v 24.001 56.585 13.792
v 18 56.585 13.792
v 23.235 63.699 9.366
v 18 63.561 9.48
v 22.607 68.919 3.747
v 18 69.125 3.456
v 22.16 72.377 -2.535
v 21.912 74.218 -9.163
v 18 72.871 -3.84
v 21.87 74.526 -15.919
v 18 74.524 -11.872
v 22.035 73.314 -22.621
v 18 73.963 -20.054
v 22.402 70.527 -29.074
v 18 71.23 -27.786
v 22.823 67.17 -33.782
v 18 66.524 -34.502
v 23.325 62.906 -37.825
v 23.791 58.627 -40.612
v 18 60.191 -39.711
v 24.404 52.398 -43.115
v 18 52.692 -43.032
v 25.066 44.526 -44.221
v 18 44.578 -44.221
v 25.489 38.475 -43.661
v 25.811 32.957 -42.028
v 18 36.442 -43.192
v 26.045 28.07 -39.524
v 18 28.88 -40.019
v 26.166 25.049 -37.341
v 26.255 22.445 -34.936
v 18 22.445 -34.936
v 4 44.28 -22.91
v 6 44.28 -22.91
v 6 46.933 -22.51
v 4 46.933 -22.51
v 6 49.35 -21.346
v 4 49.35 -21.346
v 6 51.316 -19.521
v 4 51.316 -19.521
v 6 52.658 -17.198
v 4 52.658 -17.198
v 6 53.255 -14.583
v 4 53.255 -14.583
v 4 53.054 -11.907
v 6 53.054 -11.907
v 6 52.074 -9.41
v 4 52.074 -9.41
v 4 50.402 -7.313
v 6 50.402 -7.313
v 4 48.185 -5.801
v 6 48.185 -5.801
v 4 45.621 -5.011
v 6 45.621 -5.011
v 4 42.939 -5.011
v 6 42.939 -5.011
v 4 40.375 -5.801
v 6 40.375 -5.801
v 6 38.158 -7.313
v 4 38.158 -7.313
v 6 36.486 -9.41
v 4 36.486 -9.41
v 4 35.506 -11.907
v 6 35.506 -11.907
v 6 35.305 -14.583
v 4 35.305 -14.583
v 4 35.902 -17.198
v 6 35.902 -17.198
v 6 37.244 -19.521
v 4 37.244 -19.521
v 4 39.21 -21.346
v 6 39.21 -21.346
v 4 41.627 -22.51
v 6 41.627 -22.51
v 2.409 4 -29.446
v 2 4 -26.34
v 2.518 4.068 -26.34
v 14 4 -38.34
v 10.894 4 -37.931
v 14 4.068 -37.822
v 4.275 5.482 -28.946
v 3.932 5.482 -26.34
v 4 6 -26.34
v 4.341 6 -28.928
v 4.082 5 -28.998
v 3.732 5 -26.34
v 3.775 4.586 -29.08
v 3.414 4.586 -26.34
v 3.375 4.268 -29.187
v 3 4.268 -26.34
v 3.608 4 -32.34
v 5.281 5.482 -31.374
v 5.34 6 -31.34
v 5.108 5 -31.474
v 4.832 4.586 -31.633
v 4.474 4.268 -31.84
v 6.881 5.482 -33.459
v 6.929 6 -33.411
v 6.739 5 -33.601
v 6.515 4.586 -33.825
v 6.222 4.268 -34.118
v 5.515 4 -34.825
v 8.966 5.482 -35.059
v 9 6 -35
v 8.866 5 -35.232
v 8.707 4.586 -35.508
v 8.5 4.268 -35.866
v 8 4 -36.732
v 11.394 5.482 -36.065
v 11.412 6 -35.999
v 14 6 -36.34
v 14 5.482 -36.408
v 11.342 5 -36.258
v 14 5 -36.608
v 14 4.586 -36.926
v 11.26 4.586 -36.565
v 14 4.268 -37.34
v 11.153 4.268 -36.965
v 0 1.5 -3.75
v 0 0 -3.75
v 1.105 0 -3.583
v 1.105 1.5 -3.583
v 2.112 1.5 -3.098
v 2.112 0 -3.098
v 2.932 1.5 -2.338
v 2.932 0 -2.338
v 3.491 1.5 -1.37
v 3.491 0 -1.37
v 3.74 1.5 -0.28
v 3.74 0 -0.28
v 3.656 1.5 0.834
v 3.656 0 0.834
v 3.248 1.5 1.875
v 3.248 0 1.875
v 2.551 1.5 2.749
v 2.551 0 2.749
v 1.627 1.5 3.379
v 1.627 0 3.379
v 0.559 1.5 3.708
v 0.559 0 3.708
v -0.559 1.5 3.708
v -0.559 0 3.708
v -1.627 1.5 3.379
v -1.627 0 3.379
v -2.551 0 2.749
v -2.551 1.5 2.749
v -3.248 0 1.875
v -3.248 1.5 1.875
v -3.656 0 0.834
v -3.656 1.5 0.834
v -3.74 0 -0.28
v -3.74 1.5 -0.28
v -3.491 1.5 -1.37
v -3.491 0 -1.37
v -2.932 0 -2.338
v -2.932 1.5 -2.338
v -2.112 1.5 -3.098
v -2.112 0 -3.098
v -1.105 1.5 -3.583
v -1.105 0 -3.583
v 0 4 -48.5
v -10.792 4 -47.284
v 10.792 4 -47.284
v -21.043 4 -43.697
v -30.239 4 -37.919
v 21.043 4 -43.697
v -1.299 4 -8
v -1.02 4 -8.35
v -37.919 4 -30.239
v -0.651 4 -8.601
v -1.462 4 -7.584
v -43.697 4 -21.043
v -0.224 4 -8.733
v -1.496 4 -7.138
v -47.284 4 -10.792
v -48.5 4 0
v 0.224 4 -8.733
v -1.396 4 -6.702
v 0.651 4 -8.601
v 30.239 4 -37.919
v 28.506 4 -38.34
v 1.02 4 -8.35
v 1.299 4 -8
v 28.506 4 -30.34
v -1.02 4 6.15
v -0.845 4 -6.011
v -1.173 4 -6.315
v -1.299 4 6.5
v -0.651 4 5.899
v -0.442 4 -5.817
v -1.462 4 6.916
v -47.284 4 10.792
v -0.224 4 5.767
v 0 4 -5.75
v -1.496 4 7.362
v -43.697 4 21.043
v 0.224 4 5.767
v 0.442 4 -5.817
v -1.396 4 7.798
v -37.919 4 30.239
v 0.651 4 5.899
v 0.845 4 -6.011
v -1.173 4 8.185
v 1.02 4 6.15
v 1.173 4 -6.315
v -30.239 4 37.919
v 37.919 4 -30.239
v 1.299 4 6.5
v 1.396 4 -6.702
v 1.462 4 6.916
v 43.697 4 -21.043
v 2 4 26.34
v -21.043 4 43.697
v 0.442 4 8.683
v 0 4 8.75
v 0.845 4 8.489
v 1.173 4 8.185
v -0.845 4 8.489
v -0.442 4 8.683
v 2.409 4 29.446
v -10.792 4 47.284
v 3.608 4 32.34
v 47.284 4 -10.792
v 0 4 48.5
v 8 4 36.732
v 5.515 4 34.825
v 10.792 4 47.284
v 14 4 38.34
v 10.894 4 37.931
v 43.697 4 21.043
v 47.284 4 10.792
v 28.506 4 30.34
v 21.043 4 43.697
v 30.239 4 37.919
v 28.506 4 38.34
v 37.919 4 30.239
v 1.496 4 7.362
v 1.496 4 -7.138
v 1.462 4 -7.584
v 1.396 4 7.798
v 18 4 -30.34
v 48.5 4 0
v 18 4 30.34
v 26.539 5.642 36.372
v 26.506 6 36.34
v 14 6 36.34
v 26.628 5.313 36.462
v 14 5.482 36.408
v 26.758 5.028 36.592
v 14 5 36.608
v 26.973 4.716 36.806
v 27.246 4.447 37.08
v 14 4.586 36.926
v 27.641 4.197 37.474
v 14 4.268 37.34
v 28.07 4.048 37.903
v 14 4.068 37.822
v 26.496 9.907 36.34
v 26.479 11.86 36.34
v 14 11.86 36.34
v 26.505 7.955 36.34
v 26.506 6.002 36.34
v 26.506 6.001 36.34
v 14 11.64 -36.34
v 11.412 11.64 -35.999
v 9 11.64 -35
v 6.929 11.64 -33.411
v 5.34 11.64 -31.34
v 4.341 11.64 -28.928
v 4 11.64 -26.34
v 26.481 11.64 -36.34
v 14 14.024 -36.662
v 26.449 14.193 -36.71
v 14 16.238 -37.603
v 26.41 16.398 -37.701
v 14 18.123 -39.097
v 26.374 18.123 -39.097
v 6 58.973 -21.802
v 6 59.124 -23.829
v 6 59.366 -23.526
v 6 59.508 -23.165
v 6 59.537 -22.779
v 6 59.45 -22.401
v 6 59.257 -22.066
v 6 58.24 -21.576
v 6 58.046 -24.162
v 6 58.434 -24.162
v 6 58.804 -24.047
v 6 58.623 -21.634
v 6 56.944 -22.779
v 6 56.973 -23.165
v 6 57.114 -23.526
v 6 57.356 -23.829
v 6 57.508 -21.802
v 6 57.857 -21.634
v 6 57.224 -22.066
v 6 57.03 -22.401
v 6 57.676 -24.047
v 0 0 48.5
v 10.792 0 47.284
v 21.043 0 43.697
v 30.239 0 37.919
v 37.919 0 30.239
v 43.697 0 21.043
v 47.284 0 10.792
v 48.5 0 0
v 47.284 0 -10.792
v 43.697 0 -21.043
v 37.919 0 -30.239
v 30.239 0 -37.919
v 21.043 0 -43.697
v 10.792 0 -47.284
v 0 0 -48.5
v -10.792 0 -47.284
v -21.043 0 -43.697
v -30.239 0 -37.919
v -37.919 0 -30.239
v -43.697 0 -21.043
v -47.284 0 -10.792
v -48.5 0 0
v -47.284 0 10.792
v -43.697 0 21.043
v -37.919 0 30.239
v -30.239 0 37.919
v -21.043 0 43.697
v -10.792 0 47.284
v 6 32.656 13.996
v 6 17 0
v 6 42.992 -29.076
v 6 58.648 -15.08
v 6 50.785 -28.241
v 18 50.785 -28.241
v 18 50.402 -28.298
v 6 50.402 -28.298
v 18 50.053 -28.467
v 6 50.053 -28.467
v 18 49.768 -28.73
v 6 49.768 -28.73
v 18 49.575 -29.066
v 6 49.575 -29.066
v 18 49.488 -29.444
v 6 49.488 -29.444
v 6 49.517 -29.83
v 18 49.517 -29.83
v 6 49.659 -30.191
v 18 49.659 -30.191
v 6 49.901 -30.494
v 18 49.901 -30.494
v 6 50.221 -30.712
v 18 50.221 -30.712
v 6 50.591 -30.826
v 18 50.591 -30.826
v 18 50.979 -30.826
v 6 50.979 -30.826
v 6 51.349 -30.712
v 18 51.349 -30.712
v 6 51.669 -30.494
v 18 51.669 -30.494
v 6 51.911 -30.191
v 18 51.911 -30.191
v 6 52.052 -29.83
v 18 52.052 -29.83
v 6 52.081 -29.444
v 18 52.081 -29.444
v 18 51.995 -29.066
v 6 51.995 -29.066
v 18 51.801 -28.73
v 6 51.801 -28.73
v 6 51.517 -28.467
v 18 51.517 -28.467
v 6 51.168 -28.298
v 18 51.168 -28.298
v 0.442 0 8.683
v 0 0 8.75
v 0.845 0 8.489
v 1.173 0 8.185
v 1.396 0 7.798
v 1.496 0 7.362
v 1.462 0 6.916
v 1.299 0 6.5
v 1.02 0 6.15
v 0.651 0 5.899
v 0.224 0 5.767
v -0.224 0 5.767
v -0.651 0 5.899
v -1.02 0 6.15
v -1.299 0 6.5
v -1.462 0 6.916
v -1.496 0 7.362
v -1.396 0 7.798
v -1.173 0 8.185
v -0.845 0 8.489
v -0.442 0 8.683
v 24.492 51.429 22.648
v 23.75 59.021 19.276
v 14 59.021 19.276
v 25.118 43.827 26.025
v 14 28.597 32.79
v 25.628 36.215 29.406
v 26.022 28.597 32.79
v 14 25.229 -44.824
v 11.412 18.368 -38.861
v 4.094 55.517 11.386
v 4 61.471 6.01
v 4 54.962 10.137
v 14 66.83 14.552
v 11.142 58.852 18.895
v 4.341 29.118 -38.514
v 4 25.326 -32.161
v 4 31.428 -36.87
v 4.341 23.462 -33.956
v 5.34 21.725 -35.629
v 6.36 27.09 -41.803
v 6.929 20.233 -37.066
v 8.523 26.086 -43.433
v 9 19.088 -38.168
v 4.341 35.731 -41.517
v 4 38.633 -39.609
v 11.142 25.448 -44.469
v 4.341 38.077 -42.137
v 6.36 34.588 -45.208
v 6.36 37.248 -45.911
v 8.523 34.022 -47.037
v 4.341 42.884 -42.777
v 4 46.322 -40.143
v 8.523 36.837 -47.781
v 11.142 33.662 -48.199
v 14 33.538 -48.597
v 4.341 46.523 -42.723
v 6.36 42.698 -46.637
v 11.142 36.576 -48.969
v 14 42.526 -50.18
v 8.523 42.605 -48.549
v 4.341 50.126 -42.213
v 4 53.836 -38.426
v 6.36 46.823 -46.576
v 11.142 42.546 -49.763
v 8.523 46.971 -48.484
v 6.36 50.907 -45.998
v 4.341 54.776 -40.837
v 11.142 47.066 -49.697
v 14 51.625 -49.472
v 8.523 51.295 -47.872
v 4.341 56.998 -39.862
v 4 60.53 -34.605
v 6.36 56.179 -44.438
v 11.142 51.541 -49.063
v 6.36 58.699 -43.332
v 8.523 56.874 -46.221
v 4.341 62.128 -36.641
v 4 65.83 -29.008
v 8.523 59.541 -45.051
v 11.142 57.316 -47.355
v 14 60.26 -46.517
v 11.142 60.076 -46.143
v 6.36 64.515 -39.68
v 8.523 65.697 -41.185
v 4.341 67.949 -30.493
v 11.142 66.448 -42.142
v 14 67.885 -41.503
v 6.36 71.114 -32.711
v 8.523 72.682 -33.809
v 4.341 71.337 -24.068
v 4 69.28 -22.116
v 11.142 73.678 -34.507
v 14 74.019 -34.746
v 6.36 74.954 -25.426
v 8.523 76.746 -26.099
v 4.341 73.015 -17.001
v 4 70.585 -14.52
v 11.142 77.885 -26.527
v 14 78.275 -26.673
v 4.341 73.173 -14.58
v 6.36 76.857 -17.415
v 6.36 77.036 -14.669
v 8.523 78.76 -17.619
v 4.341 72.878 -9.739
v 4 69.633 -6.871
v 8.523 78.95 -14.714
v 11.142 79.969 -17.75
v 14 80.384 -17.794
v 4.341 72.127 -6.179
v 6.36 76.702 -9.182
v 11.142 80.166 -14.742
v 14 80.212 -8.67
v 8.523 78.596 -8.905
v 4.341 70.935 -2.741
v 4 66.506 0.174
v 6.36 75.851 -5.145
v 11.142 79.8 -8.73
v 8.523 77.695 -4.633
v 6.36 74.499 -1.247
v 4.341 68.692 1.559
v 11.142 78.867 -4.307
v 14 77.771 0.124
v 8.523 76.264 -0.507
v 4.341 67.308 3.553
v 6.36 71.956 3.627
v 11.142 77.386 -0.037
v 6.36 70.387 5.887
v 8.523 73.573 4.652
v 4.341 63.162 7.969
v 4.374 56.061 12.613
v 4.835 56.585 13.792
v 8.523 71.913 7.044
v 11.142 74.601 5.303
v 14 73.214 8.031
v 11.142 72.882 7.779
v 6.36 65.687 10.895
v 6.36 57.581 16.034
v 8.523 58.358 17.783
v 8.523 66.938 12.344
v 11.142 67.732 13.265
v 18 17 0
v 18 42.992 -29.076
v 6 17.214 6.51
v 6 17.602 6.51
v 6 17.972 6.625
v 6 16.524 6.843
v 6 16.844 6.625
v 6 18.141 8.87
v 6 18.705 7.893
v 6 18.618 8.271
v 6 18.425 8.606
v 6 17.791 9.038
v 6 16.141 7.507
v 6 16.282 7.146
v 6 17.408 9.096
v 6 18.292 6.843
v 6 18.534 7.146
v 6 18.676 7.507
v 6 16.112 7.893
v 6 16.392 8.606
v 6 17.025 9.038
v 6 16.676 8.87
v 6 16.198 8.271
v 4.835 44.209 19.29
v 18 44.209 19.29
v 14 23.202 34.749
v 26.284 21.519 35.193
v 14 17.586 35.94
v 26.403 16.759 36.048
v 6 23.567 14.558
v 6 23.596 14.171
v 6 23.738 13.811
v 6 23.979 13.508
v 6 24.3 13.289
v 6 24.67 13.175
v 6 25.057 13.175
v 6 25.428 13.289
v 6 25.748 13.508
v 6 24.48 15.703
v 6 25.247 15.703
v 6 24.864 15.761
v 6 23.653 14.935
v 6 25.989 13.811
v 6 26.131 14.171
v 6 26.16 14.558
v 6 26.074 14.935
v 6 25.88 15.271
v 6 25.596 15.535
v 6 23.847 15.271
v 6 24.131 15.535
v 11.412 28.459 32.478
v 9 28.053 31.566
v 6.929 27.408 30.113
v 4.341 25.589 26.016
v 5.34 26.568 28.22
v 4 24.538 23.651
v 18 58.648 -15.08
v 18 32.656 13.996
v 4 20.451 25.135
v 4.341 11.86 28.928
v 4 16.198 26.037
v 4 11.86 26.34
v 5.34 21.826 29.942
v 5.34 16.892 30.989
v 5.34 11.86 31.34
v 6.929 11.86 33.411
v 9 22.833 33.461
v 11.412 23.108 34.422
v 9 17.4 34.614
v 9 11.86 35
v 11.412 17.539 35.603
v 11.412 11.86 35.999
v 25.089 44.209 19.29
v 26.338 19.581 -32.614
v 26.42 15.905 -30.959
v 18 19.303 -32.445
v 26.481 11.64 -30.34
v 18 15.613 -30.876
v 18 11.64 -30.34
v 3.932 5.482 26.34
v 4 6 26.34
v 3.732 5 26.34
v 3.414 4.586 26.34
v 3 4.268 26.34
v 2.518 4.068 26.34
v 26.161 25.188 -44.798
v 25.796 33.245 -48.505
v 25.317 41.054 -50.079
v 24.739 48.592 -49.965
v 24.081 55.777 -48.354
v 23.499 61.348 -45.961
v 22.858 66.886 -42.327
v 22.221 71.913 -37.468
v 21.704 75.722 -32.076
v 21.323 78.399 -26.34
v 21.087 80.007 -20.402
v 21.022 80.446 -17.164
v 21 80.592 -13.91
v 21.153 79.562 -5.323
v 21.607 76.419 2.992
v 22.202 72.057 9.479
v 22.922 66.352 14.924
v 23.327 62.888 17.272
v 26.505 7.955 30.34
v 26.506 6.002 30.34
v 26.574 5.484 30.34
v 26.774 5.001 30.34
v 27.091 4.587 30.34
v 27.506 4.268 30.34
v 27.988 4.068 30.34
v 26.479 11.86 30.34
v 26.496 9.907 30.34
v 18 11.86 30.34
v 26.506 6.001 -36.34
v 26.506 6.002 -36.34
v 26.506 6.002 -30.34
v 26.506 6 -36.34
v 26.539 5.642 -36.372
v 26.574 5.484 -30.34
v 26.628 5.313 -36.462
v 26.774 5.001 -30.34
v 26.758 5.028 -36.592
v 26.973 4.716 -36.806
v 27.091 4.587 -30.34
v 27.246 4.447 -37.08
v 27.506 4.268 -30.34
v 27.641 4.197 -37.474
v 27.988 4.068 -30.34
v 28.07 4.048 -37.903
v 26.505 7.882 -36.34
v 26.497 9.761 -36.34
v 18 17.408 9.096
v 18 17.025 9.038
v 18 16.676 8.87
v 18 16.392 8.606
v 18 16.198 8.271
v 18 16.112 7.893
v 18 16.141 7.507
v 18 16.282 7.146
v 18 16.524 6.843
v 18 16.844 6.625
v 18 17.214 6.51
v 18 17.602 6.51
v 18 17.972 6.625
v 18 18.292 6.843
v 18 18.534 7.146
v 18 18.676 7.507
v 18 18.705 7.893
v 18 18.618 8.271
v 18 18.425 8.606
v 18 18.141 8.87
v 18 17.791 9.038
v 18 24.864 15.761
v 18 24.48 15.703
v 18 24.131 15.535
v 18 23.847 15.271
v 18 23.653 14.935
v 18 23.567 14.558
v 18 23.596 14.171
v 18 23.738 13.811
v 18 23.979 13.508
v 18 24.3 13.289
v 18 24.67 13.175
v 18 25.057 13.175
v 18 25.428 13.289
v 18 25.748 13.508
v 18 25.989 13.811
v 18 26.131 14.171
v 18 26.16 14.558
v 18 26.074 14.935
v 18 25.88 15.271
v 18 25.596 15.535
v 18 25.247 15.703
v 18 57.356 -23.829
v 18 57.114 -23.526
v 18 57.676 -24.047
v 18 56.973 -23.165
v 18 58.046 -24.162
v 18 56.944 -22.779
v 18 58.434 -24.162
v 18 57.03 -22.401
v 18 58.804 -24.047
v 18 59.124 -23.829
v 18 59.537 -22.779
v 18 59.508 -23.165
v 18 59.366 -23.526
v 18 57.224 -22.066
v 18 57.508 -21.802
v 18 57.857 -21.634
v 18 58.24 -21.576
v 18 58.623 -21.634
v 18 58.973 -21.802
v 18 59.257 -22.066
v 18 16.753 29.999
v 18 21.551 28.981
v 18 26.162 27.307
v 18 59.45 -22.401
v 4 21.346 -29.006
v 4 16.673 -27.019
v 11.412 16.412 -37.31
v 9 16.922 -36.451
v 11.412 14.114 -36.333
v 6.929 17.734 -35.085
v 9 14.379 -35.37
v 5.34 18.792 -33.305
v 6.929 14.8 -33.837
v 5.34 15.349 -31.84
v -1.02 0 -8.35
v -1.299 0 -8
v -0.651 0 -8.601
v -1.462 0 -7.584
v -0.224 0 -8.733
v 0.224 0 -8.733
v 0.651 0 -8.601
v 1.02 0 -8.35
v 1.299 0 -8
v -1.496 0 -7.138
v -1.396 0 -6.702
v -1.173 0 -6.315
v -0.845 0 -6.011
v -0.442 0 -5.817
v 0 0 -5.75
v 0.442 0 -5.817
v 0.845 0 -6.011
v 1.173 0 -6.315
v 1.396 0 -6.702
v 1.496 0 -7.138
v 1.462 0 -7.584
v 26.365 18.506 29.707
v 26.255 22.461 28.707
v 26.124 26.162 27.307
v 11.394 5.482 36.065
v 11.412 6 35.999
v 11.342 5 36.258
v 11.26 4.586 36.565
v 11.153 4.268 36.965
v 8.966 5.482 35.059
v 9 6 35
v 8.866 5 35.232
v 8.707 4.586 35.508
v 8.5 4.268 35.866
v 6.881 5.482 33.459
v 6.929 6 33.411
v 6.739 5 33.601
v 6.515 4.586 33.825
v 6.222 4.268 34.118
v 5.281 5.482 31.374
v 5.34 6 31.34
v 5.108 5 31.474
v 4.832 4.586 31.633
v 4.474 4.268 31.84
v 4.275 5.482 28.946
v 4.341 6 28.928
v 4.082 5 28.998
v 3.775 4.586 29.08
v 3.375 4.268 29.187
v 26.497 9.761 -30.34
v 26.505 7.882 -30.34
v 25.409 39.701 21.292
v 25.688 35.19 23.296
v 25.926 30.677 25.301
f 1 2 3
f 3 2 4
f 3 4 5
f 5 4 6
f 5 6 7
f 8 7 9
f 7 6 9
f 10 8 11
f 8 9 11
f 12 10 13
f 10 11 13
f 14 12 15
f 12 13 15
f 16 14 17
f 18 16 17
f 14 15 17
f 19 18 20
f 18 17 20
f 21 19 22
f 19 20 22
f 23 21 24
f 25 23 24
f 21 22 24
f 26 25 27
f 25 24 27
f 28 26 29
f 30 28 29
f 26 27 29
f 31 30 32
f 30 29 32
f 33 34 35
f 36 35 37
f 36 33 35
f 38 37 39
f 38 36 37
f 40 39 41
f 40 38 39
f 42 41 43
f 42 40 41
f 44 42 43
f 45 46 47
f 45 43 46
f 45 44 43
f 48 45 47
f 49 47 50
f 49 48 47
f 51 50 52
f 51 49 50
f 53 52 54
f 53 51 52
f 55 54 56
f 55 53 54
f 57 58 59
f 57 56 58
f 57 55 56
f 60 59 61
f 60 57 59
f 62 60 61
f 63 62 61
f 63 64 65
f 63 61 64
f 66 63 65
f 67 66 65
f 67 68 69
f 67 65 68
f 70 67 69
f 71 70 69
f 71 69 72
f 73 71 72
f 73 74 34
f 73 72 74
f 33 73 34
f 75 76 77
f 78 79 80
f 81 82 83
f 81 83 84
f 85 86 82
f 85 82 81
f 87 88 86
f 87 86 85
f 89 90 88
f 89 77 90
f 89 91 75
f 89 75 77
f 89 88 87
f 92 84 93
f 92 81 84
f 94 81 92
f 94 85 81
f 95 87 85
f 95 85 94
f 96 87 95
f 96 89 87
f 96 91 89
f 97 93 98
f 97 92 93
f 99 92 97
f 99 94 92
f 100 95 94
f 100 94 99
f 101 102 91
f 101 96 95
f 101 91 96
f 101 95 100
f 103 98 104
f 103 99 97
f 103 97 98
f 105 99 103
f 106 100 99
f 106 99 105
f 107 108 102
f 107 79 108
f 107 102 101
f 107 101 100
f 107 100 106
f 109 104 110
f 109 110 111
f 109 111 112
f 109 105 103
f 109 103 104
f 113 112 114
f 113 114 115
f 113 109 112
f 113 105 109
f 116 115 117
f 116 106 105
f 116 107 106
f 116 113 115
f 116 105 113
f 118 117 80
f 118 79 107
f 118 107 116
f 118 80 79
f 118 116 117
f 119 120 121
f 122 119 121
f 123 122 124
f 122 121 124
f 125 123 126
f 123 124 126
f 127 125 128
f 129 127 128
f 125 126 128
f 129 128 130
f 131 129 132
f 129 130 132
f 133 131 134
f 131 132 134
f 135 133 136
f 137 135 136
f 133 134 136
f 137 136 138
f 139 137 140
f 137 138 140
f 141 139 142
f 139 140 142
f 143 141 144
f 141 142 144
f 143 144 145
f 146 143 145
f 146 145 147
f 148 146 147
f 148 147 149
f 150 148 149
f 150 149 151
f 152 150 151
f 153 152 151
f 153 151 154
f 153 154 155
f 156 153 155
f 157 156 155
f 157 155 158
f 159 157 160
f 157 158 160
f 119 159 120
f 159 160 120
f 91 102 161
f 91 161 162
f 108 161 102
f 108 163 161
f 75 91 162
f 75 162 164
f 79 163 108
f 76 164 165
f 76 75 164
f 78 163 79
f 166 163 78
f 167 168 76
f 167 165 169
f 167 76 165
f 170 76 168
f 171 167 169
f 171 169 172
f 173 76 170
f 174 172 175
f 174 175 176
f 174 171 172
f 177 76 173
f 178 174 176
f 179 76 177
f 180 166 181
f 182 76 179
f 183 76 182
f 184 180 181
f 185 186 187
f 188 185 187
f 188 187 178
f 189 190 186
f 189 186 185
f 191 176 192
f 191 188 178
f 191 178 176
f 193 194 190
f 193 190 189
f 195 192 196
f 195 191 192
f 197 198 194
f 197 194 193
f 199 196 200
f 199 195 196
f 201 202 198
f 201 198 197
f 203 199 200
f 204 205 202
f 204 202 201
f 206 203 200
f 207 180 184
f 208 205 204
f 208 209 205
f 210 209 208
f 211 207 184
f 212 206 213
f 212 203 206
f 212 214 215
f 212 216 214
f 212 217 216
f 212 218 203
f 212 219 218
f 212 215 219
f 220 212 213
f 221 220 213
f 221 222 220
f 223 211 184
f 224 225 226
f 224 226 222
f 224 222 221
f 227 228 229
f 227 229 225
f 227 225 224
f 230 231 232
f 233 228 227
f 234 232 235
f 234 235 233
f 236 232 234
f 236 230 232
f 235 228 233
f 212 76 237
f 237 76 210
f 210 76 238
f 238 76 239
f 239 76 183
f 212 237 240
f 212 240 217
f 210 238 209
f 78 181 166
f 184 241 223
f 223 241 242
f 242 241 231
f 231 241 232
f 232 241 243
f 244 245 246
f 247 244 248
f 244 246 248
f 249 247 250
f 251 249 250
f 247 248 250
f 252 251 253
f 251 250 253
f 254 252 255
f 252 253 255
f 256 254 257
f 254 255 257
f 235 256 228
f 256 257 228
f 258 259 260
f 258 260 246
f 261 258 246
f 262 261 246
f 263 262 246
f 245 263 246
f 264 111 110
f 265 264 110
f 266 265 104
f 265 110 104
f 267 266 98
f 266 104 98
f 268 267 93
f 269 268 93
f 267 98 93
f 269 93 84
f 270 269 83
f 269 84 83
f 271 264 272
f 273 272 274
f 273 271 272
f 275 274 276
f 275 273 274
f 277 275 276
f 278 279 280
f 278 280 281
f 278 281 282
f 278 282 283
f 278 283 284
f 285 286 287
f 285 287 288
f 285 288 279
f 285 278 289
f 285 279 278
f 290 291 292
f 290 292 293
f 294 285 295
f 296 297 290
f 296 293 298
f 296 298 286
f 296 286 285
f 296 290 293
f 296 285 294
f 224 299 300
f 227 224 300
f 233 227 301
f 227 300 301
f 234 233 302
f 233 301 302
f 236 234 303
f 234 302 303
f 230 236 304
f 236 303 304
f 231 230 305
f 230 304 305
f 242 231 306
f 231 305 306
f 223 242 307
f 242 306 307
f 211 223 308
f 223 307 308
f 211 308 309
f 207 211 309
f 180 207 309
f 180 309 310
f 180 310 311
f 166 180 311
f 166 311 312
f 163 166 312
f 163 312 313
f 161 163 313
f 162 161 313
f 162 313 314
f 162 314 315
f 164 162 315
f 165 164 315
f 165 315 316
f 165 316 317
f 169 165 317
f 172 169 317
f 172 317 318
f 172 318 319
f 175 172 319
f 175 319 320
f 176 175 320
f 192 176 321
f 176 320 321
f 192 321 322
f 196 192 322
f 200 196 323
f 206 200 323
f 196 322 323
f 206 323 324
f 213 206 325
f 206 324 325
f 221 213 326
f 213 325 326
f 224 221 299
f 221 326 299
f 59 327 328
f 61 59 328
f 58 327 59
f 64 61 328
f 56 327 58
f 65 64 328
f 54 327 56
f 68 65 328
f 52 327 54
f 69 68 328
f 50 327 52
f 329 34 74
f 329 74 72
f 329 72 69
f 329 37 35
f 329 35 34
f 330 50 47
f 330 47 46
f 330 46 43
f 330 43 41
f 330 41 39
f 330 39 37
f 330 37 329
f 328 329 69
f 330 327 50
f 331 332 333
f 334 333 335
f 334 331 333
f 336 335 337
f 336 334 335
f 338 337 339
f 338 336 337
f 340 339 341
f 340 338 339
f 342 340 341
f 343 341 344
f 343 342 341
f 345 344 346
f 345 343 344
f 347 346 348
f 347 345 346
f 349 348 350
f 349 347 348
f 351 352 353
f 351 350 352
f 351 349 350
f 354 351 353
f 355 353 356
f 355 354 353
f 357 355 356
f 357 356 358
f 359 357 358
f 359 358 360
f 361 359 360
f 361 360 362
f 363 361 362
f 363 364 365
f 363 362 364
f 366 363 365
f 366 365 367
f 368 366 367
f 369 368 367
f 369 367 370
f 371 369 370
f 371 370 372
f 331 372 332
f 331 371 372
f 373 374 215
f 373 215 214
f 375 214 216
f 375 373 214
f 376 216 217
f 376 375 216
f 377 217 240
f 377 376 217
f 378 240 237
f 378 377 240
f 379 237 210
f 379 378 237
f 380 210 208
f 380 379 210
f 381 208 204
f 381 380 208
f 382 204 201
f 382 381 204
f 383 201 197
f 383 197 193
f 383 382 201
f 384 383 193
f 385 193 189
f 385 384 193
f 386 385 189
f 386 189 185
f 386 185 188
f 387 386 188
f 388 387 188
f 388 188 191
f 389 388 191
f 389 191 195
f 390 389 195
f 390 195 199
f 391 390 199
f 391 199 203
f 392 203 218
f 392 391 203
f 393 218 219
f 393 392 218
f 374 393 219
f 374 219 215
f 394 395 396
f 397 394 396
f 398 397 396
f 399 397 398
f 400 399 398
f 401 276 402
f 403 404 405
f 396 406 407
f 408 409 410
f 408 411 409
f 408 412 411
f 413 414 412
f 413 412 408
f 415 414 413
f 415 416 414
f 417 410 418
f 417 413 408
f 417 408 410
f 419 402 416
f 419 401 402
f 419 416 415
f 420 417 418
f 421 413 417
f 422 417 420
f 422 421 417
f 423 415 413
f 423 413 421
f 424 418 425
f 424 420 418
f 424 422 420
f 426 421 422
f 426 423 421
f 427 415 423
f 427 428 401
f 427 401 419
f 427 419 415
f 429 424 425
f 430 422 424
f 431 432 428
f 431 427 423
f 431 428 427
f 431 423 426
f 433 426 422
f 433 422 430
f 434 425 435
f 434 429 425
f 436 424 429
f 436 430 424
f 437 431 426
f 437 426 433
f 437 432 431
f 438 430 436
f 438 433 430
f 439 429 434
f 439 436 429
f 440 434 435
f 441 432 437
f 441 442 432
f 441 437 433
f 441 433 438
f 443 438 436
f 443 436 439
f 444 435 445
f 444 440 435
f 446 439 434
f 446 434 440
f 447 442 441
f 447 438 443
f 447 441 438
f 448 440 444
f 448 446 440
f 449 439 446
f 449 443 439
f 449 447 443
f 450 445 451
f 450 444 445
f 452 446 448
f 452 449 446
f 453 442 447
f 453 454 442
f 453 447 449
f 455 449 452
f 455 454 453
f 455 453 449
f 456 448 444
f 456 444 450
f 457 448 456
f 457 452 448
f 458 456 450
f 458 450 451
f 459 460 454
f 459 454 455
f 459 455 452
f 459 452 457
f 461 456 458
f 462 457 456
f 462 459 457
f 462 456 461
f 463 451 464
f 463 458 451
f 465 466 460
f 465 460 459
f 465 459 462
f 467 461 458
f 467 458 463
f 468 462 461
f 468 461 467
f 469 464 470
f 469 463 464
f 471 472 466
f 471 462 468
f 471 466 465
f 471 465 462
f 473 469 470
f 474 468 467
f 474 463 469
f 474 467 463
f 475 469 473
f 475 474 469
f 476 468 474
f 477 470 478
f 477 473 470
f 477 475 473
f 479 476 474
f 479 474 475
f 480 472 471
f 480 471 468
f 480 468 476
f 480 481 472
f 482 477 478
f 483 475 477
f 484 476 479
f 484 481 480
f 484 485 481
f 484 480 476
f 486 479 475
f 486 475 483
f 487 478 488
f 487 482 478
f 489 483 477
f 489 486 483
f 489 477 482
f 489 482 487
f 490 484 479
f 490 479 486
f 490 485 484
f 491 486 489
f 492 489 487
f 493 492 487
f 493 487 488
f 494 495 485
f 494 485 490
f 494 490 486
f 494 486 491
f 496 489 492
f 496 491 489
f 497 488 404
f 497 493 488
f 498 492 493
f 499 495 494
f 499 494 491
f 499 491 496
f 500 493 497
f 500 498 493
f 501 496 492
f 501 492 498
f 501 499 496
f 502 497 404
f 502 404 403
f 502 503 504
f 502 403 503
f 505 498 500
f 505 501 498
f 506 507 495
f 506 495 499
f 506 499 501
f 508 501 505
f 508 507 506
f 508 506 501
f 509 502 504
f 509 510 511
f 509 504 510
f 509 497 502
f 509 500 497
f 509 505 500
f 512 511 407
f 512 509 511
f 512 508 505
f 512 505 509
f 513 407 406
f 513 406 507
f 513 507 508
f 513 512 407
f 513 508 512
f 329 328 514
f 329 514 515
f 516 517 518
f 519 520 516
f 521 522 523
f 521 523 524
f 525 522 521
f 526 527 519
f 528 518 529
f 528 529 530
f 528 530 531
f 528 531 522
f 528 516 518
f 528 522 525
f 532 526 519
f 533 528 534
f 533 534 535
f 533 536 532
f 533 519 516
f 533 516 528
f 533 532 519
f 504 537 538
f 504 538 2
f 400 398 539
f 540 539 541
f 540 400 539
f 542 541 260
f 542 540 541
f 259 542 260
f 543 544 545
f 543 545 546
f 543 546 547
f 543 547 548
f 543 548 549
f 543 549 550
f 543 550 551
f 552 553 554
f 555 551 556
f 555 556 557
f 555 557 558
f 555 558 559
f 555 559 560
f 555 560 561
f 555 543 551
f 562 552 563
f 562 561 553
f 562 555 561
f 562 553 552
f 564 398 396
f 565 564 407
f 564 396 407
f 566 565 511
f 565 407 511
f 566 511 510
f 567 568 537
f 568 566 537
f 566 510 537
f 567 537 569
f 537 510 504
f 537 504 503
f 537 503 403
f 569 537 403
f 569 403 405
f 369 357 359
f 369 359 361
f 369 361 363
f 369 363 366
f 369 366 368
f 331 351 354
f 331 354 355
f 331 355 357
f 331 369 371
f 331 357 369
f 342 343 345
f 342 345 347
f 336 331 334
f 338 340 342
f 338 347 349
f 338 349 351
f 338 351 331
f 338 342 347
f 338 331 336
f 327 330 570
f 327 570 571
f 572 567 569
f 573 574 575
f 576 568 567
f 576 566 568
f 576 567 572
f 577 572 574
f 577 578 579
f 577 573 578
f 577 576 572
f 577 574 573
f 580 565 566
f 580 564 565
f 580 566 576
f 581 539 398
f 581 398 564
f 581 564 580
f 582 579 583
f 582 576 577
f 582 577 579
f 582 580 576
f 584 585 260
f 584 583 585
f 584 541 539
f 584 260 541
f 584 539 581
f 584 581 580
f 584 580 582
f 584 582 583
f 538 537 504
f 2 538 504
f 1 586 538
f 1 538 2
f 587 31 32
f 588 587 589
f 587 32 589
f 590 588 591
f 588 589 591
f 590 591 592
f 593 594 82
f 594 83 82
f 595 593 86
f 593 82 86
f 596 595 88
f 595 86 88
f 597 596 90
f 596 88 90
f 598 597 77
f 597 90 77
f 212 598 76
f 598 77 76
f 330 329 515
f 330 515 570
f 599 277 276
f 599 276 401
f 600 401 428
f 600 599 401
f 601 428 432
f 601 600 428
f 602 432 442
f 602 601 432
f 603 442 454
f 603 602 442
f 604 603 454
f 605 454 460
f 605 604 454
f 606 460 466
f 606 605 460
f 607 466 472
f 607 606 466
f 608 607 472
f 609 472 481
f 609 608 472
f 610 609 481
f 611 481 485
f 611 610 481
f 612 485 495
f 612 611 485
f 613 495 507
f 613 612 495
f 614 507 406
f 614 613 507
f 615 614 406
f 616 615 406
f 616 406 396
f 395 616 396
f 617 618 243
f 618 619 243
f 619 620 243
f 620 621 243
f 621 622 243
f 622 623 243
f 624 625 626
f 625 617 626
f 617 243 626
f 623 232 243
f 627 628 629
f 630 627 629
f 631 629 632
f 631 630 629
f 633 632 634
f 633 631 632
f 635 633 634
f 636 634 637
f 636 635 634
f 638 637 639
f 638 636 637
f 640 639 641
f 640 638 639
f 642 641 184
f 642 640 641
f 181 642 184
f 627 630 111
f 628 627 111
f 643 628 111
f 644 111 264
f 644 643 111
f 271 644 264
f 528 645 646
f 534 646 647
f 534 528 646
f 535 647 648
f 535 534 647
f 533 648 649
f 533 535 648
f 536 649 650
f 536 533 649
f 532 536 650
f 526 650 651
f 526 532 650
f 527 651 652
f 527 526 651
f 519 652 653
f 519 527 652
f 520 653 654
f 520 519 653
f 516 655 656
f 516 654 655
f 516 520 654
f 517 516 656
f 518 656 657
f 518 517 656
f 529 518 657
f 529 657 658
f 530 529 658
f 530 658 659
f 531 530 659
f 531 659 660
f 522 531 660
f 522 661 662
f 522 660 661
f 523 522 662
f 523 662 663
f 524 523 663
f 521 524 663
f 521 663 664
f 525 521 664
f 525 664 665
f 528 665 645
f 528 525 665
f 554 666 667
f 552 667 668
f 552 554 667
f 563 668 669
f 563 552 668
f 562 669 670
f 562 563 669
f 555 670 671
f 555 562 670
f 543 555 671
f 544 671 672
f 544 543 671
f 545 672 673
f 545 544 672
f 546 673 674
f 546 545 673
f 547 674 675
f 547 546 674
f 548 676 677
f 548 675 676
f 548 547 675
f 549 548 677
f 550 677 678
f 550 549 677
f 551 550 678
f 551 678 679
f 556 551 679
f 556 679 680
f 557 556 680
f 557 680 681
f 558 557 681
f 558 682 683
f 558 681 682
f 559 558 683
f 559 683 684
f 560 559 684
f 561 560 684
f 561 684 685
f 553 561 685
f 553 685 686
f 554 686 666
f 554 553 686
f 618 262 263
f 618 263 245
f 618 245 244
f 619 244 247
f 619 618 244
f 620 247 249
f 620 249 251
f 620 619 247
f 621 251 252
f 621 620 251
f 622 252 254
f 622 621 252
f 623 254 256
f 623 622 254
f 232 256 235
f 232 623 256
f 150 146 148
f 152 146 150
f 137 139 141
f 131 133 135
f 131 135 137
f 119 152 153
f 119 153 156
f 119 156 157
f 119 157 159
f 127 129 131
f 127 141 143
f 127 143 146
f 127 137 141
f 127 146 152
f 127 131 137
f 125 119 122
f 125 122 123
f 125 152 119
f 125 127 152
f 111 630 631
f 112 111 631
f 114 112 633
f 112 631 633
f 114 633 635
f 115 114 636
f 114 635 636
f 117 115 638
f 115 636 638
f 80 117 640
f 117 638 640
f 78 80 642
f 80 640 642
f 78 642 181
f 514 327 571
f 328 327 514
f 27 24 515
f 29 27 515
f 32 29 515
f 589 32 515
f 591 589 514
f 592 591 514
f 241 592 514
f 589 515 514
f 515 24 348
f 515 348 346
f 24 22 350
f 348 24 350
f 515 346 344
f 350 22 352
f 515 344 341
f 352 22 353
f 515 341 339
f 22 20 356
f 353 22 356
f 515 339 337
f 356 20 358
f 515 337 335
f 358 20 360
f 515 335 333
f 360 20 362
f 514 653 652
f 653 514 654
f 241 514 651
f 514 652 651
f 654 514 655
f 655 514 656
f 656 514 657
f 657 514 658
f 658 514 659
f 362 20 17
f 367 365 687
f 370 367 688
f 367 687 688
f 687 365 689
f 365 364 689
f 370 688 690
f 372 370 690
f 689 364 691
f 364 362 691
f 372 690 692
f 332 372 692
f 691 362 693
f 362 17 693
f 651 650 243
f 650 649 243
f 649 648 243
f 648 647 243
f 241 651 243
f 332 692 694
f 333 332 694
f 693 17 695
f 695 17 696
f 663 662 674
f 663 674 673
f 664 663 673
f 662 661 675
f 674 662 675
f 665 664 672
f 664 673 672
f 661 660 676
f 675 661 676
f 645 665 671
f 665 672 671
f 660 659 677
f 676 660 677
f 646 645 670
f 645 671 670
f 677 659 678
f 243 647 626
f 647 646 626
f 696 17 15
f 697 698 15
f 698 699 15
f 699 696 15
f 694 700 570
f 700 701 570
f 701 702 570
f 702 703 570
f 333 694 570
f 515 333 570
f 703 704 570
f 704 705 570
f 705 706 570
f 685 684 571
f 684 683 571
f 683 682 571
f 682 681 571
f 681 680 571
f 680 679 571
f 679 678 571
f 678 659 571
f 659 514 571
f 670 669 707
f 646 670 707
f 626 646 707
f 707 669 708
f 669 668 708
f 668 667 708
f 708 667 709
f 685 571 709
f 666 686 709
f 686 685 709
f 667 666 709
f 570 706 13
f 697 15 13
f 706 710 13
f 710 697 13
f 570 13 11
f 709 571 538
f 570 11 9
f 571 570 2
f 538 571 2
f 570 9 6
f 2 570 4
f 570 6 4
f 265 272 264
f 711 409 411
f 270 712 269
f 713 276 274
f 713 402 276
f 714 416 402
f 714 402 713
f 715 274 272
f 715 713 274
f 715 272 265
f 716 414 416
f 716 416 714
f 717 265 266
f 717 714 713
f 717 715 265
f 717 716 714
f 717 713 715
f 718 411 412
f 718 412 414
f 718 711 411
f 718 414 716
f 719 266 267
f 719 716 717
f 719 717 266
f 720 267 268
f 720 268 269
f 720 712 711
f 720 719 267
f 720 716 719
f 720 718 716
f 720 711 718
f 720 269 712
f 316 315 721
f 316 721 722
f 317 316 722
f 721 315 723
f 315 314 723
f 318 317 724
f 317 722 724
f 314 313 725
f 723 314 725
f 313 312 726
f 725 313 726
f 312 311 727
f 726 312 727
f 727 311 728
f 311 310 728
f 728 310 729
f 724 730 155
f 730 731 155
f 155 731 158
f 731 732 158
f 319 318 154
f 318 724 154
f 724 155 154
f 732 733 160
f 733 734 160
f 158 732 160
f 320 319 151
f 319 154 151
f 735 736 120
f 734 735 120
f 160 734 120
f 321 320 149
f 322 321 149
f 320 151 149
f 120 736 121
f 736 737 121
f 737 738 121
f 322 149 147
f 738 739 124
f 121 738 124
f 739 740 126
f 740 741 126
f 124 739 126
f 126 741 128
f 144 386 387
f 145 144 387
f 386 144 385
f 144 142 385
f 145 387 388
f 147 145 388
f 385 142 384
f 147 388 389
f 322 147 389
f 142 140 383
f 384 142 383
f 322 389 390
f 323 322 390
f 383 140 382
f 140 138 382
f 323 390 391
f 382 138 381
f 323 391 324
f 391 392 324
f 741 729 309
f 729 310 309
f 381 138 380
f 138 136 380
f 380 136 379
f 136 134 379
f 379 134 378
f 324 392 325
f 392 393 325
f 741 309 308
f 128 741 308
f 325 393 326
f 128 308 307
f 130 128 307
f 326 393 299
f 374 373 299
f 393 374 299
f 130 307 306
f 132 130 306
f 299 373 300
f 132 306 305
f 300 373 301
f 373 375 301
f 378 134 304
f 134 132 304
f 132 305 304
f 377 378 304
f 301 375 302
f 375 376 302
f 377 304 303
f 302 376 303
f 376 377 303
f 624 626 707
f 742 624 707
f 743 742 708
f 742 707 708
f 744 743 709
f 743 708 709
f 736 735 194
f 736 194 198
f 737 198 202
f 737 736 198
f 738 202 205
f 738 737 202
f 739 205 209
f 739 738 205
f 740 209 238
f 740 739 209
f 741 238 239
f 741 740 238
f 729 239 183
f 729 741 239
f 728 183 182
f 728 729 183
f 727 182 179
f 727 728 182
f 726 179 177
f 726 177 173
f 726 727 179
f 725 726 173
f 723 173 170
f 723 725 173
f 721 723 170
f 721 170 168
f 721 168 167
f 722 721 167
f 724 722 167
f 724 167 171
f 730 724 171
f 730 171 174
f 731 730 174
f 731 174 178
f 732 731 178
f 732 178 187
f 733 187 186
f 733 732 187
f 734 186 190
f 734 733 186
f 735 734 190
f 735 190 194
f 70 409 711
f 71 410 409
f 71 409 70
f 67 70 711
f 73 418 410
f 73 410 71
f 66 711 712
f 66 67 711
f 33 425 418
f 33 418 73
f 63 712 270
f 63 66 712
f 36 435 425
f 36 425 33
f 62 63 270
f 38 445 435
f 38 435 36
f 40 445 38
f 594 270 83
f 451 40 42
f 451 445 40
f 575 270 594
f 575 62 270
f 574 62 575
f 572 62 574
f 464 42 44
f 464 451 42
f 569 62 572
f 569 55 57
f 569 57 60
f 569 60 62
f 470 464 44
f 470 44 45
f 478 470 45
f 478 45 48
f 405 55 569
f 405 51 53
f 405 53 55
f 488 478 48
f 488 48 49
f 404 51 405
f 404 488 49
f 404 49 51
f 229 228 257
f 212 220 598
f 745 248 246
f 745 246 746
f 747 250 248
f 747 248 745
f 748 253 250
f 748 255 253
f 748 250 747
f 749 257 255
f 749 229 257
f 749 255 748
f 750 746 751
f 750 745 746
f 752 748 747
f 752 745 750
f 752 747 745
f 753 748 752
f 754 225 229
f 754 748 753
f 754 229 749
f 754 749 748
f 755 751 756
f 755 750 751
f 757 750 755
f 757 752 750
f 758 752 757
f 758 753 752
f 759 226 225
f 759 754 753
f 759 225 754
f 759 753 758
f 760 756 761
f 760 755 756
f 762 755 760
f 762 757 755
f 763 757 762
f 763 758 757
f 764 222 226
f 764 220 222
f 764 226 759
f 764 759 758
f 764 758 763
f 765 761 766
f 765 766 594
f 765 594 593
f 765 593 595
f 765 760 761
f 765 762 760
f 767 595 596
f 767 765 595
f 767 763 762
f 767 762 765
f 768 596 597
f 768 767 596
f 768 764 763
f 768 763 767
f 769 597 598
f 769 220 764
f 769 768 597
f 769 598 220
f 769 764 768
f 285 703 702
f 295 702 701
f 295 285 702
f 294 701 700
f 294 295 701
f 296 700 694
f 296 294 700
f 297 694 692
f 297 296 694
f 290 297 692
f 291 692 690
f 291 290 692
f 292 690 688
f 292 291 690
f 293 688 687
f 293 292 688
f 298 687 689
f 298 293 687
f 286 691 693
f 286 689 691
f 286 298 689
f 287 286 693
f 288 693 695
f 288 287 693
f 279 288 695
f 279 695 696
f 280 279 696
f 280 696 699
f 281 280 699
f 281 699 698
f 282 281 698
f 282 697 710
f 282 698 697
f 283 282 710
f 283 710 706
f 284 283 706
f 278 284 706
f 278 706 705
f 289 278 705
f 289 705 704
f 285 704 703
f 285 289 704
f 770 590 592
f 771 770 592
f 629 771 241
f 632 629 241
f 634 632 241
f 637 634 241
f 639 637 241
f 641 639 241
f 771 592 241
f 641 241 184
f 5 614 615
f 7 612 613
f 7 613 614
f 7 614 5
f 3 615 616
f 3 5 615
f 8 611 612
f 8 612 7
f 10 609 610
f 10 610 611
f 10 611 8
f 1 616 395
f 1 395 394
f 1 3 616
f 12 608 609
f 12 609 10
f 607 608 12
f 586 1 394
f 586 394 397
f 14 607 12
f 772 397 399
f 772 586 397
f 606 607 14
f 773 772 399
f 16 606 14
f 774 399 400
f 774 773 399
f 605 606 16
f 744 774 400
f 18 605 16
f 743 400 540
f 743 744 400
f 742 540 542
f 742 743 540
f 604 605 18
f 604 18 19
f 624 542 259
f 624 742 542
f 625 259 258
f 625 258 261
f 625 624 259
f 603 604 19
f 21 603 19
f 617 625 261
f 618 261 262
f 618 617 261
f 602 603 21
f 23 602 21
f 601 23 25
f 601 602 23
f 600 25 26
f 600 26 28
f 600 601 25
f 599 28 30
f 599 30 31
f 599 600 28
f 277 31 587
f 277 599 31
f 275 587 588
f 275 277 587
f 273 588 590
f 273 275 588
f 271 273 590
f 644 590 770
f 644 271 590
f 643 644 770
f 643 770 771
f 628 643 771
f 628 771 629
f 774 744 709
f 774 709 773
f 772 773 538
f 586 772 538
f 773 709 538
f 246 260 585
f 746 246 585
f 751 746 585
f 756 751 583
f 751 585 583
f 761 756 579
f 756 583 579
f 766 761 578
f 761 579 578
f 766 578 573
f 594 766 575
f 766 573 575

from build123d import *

# Parameters (mm, degrees)
SKETCH2_R                       = 48.5
SKETCH2_R_2                     = 1.5000000000000002
BOSS_EXTRUDE1_DEPTH             = 4
SKETCH3_R                       = 3.75
CUT_EXTRUDE1_DEPTH              = 1.5
BOSS_EXTRUDE3_START             = 4
SKETCH5_R                       = 9
BOSS_EXTRUDE3_DEPTH             = 14
CUT_EXTRUDE2_START              = 6
SKETCH9_R                       = 1.299999999999999
SKETCH9_R_2                     = 1.3000000000000043
SKETCH9_R_3                     = 1.2999999999999887
CUT_EXTRUDE2_DEPTH              = 96.33374378554642
BOSS_EXTRUDE6_DEPTH             = 9
BOSS_EXTRUDE6_DIRECTION_2_REACH = 113.079
CUT_EXTRUDE3_DEPTH              = 107.62868758356173
CUT_EXTRUDE3_DEPTH_BACK         = 107.62868758356173
FILLET2_R                       = 10
FILLET3_R                       = 2
FILLET4_R                       = 2


# Some blends are built 0.0001 mm under size
with BuildPart() as part:
    # Sketch2 → Boss-Extrude1 (new body)
    with BuildSketch(Plane(origin=(0, 0, 0), x_dir=(1, 0, 0), z_dir=(0, 1, 0))):
        with Locations(Location((0, 0, 0), (0, 0, 270))):
            Circle(SKETCH2_R)
        with Locations(Location((-2.66e-15, 7.249999999999999, 0), (0, 0, 270))):
            Circle(SKETCH2_R_2, mode=Mode.SUBTRACT)
        with Locations(Location((0, -7.249999999999999, 0), (0, 0, 270))):
            Circle(SKETCH2_R_2, mode=Mode.SUBTRACT)
    extrude(amount=BOSS_EXTRUDE1_DEPTH)

    # Sketch3 → Cut-Extrude1 (cut)
    with BuildSketch(Plane.XZ):
        with Locations(Location((0, 0, 0), (0, 0, 270))):
            Circle(SKETCH3_R)
    extrude(amount=-CUT_EXTRUDE1_DEPTH, mode=Mode.SUBTRACT)

    # Sketch5 → Boss-Extrude3 (add)
    with BuildSketch(Plane(origin=(0, 0, 0), x_dir=(0, 0, -1), z_dir=(1, 0, 0)).offset(BOSS_EXTRUDE3_START)):
        with BuildLine():
            Line((30.34, 4), (-30.34, 4))
            Line((-30.34, 4), (-30.34, 11.860000000000001))
            ThreePointArc((-30.34, 11.860000000000001), (-29.57328688616134, 19.16990813910404), (-27.306519613843914, 26.161644127699585))
            Line((-27.306519613843914, 26.161644127699585), (-13.792358873261465, 56.585344889913266))
            ThreePointArc((-13.792358873261465, 56.585344889913266), (31.303559206891457, 69.10551707656947), (34.93556554151654, 22.444986978202348))
            ThreePointArc((34.93556554151654, 22.444986978202348), (31.53662148462827, 17.510838233282712), (30.34, 11.64))
            Line((30.34, 11.64), (30.34, 4))
        make_face()
        with Locations((13.909999999999995, 44.28)):
            Circle(SKETCH5_R, mode=Mode.SUBTRACT)
    extrude(amount=BOSS_EXTRUDE3_DEPTH)

    # Sketch9 → Cut-Extrude2 (cut, through all)
    with BuildSketch(Plane(origin=(0, 0, 0), x_dir=(0, 0, -1), z_dir=(1, 0, 0)).offset(CUT_EXTRUDE2_START)):
        with Locations(Location((29.540705350702062, 50.78483624530012, 0), (0, 0, 180))):
            Circle(SKETCH9_R)
        with Locations(Location((22.87605932116741, 58.24020299020328, 0), (0, 0, 180))):
            Circle(SKETCH9_R)
        with Locations(Location((-7.795885678067851, 17.4081866892785, 0), (0, 0, 180))):
            Circle(SKETCH9_R_2)
        with Locations(Location((-14.460531707602502, 24.86355343418166, 0), (0, 0, 180))):
            Circle(SKETCH9_R_3)
        Polygon((0, 17), (29.075930305122334, 42.99211951518514), (15.080173643099549, 58.648389679481774), (-13.99575666202277, 32.65627016429665), align=None)
    extrude(amount=CUT_EXTRUDE2_DEPTH, mode=Mode.SUBTRACT)

    # Sketch11 → Boss-Extrude6 (add)
    with BuildSketch(Plane(origin=(18.000000000000004, 0, 0), x_dir=(0, 0, -1), z_dir=(1, 0, 0))):
        with BuildLine():
            ThreePointArc((39.09733932490991, 18.12299218692141), (34.7464182617029, 74.01944844856713), (-19.27572866273243, 59.02104925455133))
            Line((-19.27572866273244, 59.021049254551315), (-32.78988940331492, 28.59734849233759))
            ThreePointArc((-32.78988940331492, 28.59734849233759), (-35.44270843929697, 20.41485417471641), (-36.34, 11.860000000000007))
            Line((-36.34, 11.860000000000007), (-36.34, 4))
            Line((-36.34, 4), (-30.34, 4.000000000000001))
            Line((-30.34, 4), (-30.34, 11.860000000000001))
            ThreePointArc((-30.339999999999996, 11.860000000000003), (-29.573286886161334, 19.169908139104034), (-27.30651961384391, 26.161644127699585))
            Line((-27.30651961384391, 26.161644127699585), (-19.28989223747492, 44.20904471014288))
            ThreePointArc((-19.289892237474774, 44.20904471014282), (-16.709962361716535, 50.472191847815), (-13.792358873261435, 56.58534488991329))
            ThreePointArc((-13.79235887326144, 56.58534488991327), (31.303559206891478, 69.10551707656947), (34.935565541516546, 22.444986978202333))
            ThreePointArc((34.93556554151654, 22.444986978202337), (31.536621484628263, 17.510838233282712), (30.339999999999996, 11.64))
            Line((30.34, 11.64), (30.34, 4))
            Line((30.34, 4), (36.34, 4))
            Line((36.34, 4), (36.34, 11.64))
            ThreePointArc((36.34, 11.64), (37.05797289077695, 15.162502939969631), (39.09733932490992, 18.122992186921408))
        make_face()
    extrude(amount=BOSS_EXTRUDE6_DEPTH)

    # Boss-Extrude6 direction 2: up to this face of the body (flat: up to its plane)
    boss_extrude6_direction_2_end = Plane(part.part.faces().sort_by_distance((4, 35.761181815, -7.797700276))[0])
    # Sketch11 → Boss-Extrude6 direction 2 (add, up to the picked face)
    with BuildSketch(Plane(origin=(18.000000000000004, 0, 0), x_dir=(0, 0, -1), z_dir=(1, 0, 0)), mode=Mode.PRIVATE) as boss_extrude6_direction_2_sk1:
        with BuildLine():
            ThreePointArc((39.09733932490991, 18.12299218692141), (34.7464182617029, 74.01944844856713), (-19.27572866273243, 59.02104925455133))
            Line((-19.27572866273244, 59.021049254551315), (-32.78988940331492, 28.59734849233759))
            ThreePointArc((-32.78988940331492, 28.59734849233759), (-35.44270843929697, 20.41485417471641), (-36.34, 11.860000000000007))
            Line((-36.34, 11.860000000000007), (-36.34, 4))
            Line((-36.34, 4), (-30.34, 4.000000000000001))
            Line((-30.34, 4), (-30.34, 11.860000000000001))
            ThreePointArc((-30.339999999999996, 11.860000000000003), (-29.573286886161334, 19.169908139104034), (-27.30651961384391, 26.161644127699585))
            Line((-27.30651961384391, 26.161644127699585), (-19.28989223747492, 44.20904471014288))
            ThreePointArc((-19.289892237474774, 44.20904471014282), (-16.709962361716535, 50.472191847815), (-13.792358873261435, 56.58534488991329))
            ThreePointArc((-13.79235887326144, 56.58534488991327), (31.303559206891478, 69.10551707656947), (34.935565541516546, 22.444986978202333))
            ThreePointArc((34.93556554151654, 22.444986978202337), (31.536621484628263, 17.510838233282712), (30.339999999999996, 11.64))
            Line((30.34, 11.64), (30.34, 4))
            Line((30.34, 4), (36.34, 4))
            Line((36.34, 4), (36.34, 11.64))
            ThreePointArc((36.34, 11.64), (37.05797289077695, 15.162502939969631), (39.09733932490992, 18.122992186921408))
        make_face()
    boss_extrude6_direction_2_tool1 = split(extrude(boss_extrude6_direction_2_sk1.sketch, amount=-BOSS_EXTRUDE6_DIRECTION_2_REACH, mode=Mode.PRIVATE), bisect_by=boss_extrude6_direction_2_end, keep=Keep.BOTH, mode=Mode.PRIVATE)
    add(boss_extrude6_direction_2_tool1.solids().sort_by(Axis((18, 73.072836, -34.083191), (-1, 0, 0)))[0])

    # Sketch14 → Cut-Extrude3 (cut, two sides: drawn at the far end of the back side and taken through both)
    with BuildSketch(Plane.XY.offset(-CUT_EXTRUDE3_DEPTH_BACK)):
        with BuildLine():
            Line((27.00000000000001, 80.59240999991061), (21.00000000000001, 80.59240999991061))
            ThreePointArc((21.00000000000001, 80.59240999991061), (25.222549691509585, 42.401946852226466), (26.500000000000004, 4))
            Line((26.500000000000004, 4), (27.000000000000004, 4))
            Line((27.000000000000004, 4), (27.00000000000001, 80.59240999991061))
        make_face()
    extrude(amount=CUT_EXTRUDE3_DEPTH + CUT_EXTRUDE3_DEPTH_BACK, mode=Mode.SUBTRACT)

    # Fillet2
    # the kernel refuses this fillet: 10 mm, written as the material it takes off along each edge
    with BuildSketch(Plane(origin=(4, 11.860000000000007, 36.34), x_dir=(0, 0, -1), z_dir=(0, -1, 0))) as fillet2_piece_1:
        with BuildLine():
            CenterArc((FILLET2_R, FILLET2_R), FILLET2_R, 180, 90)
            Line((0, FILLET2_R), (0, 0))
            Line((0, 0), (FILLET2_R, 0))
        make_face()
    extrude(amount=7.8600000000000065, mode=Mode.SUBTRACT)
    with BuildSketch(Plane(origin=(4, 11.86, -4.889999999999912), x_dir=(0, 0.4059507274396709, 0.9138949649118339), z_dir=(0, 0.9138949649118339, -0.4059507274396709))) as fillet2_piece_2:
        with BuildLine():
            CenterArc((41.22999999999991 - FILLET2_R, FILLET2_R), FILLET2_R, 270, 89.99999999999999)
            Line((41.22999999999991, FILLET2_R), (41.22999999999991, 0))
            Line((41.22999999999991, 0), (41.22999999999991 - FILLET2_R, 0))
        make_face()
    revolve(axis=Axis((4, 11.86, -4.889999999999912), (1, 0, 0)), revolution_arc=23.950718342801608, mode=Mode.SUBTRACT)
    with BuildSketch(Plane(origin=(4, 59.02104925455132, 19.275728662732437), x_dir=(0, -0.4059507274396704, -0.9138949649118341), z_dir=(0, -0.9138949649118341, 0.40595072743967037))) as fillet2_piece_3:
        with BuildLine():
            CenterArc((FILLET2_R, FILLET2_R), FILLET2_R, 180, 90)
            Line((-3.25e-15, FILLET2_R), (0, 0))
            Line((0, 0), (FILLET2_R, 0))
        make_face()
    extrude(amount=33.29015032394755, mode=Mode.SUBTRACT)
    with BuildSketch(Plane(origin=(4, 44.28, -13.909999999999988), x_dir=(0, -0.7203324652134898, -0.6936289638988963), z_dir=(0, -0.6936289638988963, 0.7203324652134898))) as fillet2_piece_4:
        with BuildLine():
            CenterArc((36.312409999910614 - FILLET2_R, FILLET2_R), FILLET2_R, 270, 89.99999999999999)
            Line((36.312409999910614, FILLET2_R), (36.312409999910614, 0))
            Line((36.312409999910614, 0), (36.312409999910614 - FILLET2_R, 0))
        make_face()
    revolve(axis=Axis((4, 44.28, -13.909999999999988), (1, 0, 0)), revolution_arc=202.13121786262028, mode=Mode.SUBTRACT)
    with BuildSketch(Plane(origin=(4, 4, -36.34), x_dir=(0, 0, 1), z_dir=(0, 1, 0))) as fillet2_piece_5:
        with BuildLine():
            CenterArc((FILLET2_R, FILLET2_R), FILLET2_R, 180, 90)
            Line((0, FILLET2_R), (0, 0))
            Line((0, 0), (FILLET2_R, 0))
        make_face()
    extrude(amount=7.640000000000001, mode=Mode.SUBTRACT)
    with BuildSketch(Plane(origin=(4, 11.640000000000043, -45.33999999999995), x_dir=(0, 0.7203324652134898, 0.6936289638988964), z_dir=(0, 0.6936289638988964, -0.7203324652134898))) as fillet2_piece_6:
        with BuildLine():
            CenterArc((8.999999999999945 + FILLET2_R, FILLET2_R), FILLET2_R, 180, 90)
            Line((8.999999999999941, FILLET2_R), (8.999999999999945, 0))
            Line((8.999999999999945, 0), (8.999999999999945 + FILLET2_R, 0))
        make_face()
    revolve(axis=Axis((4, 11.640000000000043, -45.33999999999995), (1, 0, 0)), revolution_arc=46.08193620542221, mode=Mode.SUBTRACT)

    # Fillet3
    fillet3_edges = [part.edges().sort_by_distance(p)[0] for p in [
        (20.250000000000014, 4, -36.34),
        (4, 4, 0),
        (20.250000000000014, 4, 36.34),
        (6.928932188134525, 4, -33.41106781186548),
        (6.928932188134525, 3.999999999999999, 33.41106781186548),
    ]]
    fillet(fillet3_edges, radius=FILLET3_R)

    # Fillet4
    fillet4_edges = [part.edges().sort_by_distance(p)[0] for p in [
        (26.500000000000032, 4.000000000000001, -34.34),
        (26.500000000000036, 4.000000000000001, 34.34),
    ]]
    fillet(fillet4_edges, radius=FILLET4_R - 0.0001)  # a hair under: the kernel refuses the full size


solid = part.part
